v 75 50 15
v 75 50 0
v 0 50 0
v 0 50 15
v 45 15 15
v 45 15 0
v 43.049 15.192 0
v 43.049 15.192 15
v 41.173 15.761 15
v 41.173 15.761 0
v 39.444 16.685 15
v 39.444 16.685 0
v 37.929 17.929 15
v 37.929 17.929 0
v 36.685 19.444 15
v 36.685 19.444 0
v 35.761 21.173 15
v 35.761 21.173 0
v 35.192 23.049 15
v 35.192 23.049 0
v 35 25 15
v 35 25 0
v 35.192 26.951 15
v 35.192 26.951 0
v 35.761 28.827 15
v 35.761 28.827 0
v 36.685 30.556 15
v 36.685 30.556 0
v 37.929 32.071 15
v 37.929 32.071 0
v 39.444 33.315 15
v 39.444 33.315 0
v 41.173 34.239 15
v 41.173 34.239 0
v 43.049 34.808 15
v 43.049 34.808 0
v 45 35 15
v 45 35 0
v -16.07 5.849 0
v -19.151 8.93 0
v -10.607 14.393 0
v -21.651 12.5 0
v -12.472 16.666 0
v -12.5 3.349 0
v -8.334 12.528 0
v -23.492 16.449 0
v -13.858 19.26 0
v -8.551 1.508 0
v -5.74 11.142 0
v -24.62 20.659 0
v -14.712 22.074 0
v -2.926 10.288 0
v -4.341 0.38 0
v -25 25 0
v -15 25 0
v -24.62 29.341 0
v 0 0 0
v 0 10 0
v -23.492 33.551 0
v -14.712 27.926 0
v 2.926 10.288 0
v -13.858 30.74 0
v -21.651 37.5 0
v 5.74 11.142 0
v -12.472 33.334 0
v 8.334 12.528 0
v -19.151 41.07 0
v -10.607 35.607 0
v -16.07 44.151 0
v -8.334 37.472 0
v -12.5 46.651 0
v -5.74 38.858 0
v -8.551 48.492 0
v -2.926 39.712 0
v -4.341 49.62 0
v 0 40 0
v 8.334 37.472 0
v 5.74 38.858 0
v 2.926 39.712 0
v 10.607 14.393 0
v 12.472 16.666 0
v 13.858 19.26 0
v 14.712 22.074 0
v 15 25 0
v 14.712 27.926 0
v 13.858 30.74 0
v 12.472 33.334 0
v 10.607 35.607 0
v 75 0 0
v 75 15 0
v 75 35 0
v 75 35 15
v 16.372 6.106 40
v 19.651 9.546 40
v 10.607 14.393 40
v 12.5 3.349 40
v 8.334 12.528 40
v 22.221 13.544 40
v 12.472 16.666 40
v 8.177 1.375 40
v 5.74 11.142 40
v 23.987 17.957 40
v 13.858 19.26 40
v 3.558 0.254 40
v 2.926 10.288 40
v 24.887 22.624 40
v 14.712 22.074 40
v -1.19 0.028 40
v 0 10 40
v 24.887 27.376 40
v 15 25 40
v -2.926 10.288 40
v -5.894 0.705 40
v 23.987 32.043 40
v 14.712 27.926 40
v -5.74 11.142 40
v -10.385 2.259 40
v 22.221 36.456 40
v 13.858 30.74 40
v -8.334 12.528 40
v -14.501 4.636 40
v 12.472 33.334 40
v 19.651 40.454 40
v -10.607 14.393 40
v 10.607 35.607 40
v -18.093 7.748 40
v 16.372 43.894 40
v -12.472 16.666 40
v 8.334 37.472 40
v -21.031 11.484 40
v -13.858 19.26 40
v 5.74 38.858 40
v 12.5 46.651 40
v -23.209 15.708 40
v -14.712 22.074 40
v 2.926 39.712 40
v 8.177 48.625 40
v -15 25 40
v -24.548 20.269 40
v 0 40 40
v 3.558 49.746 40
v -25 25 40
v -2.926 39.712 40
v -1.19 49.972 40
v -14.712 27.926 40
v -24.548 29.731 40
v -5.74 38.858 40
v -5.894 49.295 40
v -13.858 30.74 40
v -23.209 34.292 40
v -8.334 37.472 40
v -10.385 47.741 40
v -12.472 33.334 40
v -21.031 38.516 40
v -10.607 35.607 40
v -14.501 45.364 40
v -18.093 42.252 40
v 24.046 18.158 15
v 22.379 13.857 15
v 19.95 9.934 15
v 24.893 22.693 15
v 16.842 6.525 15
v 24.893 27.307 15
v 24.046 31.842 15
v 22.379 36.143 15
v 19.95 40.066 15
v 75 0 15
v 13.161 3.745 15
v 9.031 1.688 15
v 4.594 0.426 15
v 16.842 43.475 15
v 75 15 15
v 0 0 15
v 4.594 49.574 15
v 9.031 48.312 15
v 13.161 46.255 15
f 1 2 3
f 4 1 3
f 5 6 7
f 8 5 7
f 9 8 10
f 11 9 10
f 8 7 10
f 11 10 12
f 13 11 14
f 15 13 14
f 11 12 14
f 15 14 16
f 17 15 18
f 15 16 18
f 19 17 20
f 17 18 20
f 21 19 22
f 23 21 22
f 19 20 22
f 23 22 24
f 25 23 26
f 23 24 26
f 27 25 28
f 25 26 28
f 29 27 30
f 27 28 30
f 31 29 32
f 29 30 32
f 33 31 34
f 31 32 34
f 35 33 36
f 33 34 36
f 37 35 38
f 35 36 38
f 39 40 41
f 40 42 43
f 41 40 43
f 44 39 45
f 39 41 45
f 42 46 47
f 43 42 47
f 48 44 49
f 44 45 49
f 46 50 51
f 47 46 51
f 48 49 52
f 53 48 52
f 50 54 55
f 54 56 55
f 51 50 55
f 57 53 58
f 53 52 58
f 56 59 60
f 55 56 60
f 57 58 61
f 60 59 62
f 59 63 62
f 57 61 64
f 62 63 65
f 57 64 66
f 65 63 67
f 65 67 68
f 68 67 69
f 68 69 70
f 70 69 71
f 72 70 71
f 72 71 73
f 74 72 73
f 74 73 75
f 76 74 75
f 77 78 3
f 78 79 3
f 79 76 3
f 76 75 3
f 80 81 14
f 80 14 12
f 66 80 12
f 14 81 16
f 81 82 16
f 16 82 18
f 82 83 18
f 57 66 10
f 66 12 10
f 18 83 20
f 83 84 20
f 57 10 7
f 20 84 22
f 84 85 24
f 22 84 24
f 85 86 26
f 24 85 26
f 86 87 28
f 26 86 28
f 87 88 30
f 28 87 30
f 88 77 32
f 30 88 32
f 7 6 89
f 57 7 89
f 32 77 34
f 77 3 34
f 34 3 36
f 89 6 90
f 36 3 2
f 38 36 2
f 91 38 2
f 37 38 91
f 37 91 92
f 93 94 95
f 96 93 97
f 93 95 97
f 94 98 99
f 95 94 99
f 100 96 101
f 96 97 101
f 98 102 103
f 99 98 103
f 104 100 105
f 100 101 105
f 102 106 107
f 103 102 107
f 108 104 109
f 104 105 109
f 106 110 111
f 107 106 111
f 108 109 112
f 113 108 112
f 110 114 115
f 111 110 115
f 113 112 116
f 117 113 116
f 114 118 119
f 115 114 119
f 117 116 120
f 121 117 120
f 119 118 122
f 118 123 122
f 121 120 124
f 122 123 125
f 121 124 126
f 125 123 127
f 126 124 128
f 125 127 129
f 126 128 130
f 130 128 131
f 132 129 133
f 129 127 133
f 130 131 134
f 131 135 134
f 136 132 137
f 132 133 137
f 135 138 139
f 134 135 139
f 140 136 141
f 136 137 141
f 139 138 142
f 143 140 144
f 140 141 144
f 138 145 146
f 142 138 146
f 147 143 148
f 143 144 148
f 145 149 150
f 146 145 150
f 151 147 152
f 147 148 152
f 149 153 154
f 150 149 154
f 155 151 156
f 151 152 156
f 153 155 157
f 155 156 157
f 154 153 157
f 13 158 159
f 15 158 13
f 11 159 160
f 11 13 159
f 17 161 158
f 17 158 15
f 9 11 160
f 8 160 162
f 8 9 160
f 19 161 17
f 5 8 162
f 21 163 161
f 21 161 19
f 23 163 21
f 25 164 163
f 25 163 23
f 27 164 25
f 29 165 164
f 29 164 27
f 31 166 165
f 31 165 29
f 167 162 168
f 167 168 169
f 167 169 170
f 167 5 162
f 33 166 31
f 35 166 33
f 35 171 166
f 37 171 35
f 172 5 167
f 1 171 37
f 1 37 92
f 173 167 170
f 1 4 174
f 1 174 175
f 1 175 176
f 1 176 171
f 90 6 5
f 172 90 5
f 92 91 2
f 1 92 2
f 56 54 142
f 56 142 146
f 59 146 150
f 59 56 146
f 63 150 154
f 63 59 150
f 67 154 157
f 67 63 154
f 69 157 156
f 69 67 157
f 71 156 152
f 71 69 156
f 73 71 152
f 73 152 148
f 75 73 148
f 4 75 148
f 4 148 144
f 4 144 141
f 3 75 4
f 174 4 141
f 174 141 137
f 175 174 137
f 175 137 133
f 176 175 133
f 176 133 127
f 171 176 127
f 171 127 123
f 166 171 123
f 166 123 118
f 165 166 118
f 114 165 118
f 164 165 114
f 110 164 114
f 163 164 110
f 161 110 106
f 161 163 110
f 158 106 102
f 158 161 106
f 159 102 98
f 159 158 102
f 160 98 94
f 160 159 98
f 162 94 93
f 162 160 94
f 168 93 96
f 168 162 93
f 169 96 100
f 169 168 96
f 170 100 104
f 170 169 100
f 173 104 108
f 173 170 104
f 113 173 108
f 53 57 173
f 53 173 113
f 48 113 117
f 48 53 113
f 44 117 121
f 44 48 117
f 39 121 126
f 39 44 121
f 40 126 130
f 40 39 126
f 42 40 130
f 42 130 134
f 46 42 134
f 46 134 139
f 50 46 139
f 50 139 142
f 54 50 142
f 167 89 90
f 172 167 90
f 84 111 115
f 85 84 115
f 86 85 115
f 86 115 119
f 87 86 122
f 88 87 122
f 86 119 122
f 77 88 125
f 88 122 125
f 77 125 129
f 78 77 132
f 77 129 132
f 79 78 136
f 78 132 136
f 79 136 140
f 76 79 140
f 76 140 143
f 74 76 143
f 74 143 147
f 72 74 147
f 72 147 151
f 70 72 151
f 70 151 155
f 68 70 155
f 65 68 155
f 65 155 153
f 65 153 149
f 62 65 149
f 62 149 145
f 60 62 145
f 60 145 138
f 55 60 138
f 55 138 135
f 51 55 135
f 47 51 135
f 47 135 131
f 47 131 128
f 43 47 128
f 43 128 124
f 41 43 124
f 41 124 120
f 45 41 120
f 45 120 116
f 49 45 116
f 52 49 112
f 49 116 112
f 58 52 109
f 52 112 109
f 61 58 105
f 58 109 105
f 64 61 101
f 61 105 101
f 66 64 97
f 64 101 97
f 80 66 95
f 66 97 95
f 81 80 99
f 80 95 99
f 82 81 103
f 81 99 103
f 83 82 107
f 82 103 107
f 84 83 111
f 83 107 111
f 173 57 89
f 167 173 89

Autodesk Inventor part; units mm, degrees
ref_plane "YZ Plane" through (0, 0, 0) normal (1, 0, 0) x (0, 1, 0)
ref_plane "XZ Plane" through (0, 0, 0) normal (0, 1, 0) x (-1, 0, 0)
ref_plane "XY Plane" through (0, 0, 0) normal (0, 0, 1) x (1, 0, 0)
sketch "Sketch1" plane through (0, 0, 0) normal (0, 0, 1) x (1, 0, 0)
  point P0 (0, 0)
sketch "Sketch2" plane through (0, 0, 0) normal (0, 0, 1) x (1, 0, 0)
  line L0 (0, 0) -> (75, 0)
  line L1 (75, 0) -> (75, 50)
  line L2 (75, 50) -> (0, 50)
  line L3 (0, 50) -> (0, 0)
  dimension "d0" = 75
  dimension "d1" = 50
extrude "Extrusion1" add sketch "Sketch2" along normal blind 15
sketch "Sketch3" plane through (0, 0, 0) normal (0, 0, -1) x (-1, 0, 0)
  line L0 (0, 50) -> (0, 0) projected
  circle A0 centre (0, 25) radius 25
extrude "Extrusion2" add sketch "Sketch3" against normal blind 40
sketch "Sketch4" plane through (0, 25, 40) normal (0, 0, 1) x (1, 0, 0)
  circle A0 centre (0, 0) radius 25 projected
  circle A1 centre (0, 0) radius 15
  point P0 (0, -25)
  dimension "d6" = 30
extrude "Extrusion3" cut sketch "Sketch4" against normal through all contours A1
hole "Hole1" at (45, 25, 15) direction (0, 0, -1) diameter 20 end through all
sketch "Sketch5" plane through (75, 0, 0) normal (1, 0, 0) x (0, 0, -1)
  line L0 (0, 15) -> (-15, 15)
  line L1 (-15, 15) -> (0, 15)
  line L2 (0, 15) -> (0, 35)
  line L3 (0, 35) -> (-15, 35)
  line L4 (-15, 35) -> (-15, 15)
  dimension "d19" = 20
  dimension "d20" = 15
extrude "Extrusion4" cut sketch "Sketch5" against normal up to next
properties part number "Locator"
